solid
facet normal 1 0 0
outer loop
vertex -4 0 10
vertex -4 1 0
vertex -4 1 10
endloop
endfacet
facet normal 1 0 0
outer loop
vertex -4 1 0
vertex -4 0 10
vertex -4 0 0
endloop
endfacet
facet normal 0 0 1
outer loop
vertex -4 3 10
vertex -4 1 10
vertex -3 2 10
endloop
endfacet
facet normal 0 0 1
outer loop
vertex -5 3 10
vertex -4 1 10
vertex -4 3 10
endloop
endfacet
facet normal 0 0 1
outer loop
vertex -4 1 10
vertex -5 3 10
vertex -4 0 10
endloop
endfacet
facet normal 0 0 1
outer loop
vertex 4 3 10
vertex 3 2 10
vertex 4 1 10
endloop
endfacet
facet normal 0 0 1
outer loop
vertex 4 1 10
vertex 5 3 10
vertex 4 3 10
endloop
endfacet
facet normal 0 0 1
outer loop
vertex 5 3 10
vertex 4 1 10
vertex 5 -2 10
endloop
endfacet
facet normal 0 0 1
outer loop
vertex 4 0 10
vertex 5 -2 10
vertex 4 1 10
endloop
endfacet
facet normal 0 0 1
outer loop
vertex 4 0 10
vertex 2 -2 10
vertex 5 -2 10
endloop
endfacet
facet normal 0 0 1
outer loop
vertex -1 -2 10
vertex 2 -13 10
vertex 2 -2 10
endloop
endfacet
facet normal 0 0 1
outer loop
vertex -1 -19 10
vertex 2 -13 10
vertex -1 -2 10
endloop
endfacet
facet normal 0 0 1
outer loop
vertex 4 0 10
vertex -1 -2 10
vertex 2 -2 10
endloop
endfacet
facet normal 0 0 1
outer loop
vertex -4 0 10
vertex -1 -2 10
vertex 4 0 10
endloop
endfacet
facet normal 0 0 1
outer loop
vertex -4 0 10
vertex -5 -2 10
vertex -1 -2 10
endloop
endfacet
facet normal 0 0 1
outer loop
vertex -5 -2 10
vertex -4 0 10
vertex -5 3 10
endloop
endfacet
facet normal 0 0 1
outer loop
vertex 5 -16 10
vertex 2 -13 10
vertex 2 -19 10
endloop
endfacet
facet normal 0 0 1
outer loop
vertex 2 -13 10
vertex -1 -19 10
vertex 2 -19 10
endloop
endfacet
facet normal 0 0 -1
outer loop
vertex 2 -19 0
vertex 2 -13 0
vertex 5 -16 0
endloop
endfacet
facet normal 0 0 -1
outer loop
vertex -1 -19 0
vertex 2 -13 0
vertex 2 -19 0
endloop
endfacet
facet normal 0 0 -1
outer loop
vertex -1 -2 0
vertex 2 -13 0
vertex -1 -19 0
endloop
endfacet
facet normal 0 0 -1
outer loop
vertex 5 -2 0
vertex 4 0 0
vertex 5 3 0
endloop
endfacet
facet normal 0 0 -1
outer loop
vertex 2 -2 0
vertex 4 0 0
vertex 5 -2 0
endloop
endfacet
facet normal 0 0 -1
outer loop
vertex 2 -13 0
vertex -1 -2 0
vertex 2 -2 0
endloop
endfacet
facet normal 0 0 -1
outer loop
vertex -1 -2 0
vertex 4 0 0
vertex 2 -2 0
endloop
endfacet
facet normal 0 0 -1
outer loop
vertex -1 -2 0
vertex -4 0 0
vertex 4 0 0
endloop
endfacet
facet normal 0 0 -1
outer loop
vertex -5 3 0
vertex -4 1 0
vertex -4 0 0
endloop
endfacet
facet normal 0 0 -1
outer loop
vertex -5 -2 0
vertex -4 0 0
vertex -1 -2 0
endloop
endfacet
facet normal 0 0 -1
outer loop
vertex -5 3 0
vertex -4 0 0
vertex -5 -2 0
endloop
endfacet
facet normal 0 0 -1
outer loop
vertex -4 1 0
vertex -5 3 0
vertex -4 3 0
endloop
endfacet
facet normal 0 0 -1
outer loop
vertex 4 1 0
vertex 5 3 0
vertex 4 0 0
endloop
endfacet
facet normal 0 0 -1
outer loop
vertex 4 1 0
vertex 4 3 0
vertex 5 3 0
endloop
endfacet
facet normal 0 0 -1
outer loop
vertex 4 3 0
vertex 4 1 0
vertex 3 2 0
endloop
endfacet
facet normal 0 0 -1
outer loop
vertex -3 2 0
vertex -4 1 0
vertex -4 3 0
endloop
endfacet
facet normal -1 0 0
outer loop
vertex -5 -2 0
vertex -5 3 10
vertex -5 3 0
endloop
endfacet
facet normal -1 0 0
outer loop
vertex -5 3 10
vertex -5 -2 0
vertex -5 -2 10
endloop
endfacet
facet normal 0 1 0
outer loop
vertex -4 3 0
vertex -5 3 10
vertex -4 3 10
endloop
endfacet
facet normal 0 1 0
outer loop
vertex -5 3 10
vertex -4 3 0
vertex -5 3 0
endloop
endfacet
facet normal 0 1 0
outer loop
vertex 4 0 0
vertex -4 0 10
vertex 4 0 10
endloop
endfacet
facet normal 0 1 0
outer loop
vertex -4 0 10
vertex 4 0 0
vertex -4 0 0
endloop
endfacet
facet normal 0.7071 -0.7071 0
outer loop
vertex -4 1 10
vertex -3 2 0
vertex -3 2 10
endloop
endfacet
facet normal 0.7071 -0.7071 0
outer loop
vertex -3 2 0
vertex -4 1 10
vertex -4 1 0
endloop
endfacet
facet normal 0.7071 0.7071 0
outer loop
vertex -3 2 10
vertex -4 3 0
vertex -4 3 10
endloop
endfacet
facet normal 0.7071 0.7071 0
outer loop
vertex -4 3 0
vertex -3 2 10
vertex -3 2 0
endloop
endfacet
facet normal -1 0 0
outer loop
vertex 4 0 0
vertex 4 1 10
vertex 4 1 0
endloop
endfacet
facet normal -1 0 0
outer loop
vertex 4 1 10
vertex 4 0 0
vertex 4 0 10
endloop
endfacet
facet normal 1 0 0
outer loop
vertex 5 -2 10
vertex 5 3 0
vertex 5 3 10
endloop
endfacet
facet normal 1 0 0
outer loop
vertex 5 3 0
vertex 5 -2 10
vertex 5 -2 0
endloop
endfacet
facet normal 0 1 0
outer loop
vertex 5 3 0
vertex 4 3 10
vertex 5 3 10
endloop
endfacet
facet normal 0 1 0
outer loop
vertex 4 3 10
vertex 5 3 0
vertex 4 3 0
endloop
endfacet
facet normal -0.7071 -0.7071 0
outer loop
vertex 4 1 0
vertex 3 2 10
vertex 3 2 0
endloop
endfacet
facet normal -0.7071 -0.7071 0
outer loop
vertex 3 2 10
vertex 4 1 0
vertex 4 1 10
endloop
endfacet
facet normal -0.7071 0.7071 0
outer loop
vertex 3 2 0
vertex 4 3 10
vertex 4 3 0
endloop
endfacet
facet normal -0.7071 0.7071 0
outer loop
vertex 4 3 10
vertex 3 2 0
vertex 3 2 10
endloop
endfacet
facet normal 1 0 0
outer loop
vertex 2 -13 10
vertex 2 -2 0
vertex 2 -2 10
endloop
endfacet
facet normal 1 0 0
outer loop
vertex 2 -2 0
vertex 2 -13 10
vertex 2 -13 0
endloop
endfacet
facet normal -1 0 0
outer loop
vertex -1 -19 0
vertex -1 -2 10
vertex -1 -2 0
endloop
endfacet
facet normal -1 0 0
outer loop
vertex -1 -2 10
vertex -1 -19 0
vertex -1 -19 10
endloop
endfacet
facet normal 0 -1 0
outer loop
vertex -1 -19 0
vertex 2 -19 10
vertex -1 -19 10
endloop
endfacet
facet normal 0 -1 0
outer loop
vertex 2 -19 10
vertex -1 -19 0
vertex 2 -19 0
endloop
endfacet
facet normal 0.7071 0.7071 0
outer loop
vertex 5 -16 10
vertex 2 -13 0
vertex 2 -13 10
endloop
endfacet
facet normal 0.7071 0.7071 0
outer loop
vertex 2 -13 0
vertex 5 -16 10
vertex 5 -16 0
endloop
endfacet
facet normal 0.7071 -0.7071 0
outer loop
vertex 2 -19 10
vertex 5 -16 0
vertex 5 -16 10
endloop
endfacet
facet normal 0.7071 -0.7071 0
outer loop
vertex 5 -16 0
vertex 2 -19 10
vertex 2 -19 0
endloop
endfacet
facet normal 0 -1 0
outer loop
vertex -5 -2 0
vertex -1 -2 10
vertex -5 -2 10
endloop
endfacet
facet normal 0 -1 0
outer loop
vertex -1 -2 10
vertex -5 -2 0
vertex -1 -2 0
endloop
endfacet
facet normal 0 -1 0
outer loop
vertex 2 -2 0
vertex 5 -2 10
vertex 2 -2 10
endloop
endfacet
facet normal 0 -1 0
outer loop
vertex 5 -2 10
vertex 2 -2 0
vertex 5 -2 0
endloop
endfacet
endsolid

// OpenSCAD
// This clip, meant to be used in pairs, was designed to hold small items in place on a vented rack shelf.

// Depth in the Z direction (height on the print bed)
depth=10;
// Distance between the outer edges of the base clips.
width = 10;
// Thickness of the horizontal plate.
floor_thickness = 2;
// Thickness of the bottom clip legs.
base_thickness = 1;
// Height of the bottom clips.
base_height=3;
// Thickness of the top clip leg.
top_thickness = 3;
// Height of the top clip.
top_height=19;
// Offset of the top clip on the base plate. At 0, the back of the clip is at the center of the clip.
top_offset = -1;

module clip(height, thickness) {
    translate([thickness/2,height/2,0]) union() {
        cube([thickness,height,depth], true);
        latch_side = sqrt(2 * thickness * thickness);
        translate([thickness/2,height/2-thickness,0]) rotate([0,0,45]) cube([latch_side,latch_side,depth], true);
    }
}

module top() {
    union() {
        translate([0,floor_thickness/2,0]) 
        cube([width,floor_thickness,depth], true);
        translate([top_offset,0,0]) 
        clip(top_height, top_thickness);
    }
}

translate([0,0,depth/2])
union() {
    translate([-width/2,0,0]) clip(base_height, base_thickness);
    translate([width/2,0,0]) rotate([0,180,0]) clip(base_height, base_thickness);
    rotate([180,0,0]) top();
}
